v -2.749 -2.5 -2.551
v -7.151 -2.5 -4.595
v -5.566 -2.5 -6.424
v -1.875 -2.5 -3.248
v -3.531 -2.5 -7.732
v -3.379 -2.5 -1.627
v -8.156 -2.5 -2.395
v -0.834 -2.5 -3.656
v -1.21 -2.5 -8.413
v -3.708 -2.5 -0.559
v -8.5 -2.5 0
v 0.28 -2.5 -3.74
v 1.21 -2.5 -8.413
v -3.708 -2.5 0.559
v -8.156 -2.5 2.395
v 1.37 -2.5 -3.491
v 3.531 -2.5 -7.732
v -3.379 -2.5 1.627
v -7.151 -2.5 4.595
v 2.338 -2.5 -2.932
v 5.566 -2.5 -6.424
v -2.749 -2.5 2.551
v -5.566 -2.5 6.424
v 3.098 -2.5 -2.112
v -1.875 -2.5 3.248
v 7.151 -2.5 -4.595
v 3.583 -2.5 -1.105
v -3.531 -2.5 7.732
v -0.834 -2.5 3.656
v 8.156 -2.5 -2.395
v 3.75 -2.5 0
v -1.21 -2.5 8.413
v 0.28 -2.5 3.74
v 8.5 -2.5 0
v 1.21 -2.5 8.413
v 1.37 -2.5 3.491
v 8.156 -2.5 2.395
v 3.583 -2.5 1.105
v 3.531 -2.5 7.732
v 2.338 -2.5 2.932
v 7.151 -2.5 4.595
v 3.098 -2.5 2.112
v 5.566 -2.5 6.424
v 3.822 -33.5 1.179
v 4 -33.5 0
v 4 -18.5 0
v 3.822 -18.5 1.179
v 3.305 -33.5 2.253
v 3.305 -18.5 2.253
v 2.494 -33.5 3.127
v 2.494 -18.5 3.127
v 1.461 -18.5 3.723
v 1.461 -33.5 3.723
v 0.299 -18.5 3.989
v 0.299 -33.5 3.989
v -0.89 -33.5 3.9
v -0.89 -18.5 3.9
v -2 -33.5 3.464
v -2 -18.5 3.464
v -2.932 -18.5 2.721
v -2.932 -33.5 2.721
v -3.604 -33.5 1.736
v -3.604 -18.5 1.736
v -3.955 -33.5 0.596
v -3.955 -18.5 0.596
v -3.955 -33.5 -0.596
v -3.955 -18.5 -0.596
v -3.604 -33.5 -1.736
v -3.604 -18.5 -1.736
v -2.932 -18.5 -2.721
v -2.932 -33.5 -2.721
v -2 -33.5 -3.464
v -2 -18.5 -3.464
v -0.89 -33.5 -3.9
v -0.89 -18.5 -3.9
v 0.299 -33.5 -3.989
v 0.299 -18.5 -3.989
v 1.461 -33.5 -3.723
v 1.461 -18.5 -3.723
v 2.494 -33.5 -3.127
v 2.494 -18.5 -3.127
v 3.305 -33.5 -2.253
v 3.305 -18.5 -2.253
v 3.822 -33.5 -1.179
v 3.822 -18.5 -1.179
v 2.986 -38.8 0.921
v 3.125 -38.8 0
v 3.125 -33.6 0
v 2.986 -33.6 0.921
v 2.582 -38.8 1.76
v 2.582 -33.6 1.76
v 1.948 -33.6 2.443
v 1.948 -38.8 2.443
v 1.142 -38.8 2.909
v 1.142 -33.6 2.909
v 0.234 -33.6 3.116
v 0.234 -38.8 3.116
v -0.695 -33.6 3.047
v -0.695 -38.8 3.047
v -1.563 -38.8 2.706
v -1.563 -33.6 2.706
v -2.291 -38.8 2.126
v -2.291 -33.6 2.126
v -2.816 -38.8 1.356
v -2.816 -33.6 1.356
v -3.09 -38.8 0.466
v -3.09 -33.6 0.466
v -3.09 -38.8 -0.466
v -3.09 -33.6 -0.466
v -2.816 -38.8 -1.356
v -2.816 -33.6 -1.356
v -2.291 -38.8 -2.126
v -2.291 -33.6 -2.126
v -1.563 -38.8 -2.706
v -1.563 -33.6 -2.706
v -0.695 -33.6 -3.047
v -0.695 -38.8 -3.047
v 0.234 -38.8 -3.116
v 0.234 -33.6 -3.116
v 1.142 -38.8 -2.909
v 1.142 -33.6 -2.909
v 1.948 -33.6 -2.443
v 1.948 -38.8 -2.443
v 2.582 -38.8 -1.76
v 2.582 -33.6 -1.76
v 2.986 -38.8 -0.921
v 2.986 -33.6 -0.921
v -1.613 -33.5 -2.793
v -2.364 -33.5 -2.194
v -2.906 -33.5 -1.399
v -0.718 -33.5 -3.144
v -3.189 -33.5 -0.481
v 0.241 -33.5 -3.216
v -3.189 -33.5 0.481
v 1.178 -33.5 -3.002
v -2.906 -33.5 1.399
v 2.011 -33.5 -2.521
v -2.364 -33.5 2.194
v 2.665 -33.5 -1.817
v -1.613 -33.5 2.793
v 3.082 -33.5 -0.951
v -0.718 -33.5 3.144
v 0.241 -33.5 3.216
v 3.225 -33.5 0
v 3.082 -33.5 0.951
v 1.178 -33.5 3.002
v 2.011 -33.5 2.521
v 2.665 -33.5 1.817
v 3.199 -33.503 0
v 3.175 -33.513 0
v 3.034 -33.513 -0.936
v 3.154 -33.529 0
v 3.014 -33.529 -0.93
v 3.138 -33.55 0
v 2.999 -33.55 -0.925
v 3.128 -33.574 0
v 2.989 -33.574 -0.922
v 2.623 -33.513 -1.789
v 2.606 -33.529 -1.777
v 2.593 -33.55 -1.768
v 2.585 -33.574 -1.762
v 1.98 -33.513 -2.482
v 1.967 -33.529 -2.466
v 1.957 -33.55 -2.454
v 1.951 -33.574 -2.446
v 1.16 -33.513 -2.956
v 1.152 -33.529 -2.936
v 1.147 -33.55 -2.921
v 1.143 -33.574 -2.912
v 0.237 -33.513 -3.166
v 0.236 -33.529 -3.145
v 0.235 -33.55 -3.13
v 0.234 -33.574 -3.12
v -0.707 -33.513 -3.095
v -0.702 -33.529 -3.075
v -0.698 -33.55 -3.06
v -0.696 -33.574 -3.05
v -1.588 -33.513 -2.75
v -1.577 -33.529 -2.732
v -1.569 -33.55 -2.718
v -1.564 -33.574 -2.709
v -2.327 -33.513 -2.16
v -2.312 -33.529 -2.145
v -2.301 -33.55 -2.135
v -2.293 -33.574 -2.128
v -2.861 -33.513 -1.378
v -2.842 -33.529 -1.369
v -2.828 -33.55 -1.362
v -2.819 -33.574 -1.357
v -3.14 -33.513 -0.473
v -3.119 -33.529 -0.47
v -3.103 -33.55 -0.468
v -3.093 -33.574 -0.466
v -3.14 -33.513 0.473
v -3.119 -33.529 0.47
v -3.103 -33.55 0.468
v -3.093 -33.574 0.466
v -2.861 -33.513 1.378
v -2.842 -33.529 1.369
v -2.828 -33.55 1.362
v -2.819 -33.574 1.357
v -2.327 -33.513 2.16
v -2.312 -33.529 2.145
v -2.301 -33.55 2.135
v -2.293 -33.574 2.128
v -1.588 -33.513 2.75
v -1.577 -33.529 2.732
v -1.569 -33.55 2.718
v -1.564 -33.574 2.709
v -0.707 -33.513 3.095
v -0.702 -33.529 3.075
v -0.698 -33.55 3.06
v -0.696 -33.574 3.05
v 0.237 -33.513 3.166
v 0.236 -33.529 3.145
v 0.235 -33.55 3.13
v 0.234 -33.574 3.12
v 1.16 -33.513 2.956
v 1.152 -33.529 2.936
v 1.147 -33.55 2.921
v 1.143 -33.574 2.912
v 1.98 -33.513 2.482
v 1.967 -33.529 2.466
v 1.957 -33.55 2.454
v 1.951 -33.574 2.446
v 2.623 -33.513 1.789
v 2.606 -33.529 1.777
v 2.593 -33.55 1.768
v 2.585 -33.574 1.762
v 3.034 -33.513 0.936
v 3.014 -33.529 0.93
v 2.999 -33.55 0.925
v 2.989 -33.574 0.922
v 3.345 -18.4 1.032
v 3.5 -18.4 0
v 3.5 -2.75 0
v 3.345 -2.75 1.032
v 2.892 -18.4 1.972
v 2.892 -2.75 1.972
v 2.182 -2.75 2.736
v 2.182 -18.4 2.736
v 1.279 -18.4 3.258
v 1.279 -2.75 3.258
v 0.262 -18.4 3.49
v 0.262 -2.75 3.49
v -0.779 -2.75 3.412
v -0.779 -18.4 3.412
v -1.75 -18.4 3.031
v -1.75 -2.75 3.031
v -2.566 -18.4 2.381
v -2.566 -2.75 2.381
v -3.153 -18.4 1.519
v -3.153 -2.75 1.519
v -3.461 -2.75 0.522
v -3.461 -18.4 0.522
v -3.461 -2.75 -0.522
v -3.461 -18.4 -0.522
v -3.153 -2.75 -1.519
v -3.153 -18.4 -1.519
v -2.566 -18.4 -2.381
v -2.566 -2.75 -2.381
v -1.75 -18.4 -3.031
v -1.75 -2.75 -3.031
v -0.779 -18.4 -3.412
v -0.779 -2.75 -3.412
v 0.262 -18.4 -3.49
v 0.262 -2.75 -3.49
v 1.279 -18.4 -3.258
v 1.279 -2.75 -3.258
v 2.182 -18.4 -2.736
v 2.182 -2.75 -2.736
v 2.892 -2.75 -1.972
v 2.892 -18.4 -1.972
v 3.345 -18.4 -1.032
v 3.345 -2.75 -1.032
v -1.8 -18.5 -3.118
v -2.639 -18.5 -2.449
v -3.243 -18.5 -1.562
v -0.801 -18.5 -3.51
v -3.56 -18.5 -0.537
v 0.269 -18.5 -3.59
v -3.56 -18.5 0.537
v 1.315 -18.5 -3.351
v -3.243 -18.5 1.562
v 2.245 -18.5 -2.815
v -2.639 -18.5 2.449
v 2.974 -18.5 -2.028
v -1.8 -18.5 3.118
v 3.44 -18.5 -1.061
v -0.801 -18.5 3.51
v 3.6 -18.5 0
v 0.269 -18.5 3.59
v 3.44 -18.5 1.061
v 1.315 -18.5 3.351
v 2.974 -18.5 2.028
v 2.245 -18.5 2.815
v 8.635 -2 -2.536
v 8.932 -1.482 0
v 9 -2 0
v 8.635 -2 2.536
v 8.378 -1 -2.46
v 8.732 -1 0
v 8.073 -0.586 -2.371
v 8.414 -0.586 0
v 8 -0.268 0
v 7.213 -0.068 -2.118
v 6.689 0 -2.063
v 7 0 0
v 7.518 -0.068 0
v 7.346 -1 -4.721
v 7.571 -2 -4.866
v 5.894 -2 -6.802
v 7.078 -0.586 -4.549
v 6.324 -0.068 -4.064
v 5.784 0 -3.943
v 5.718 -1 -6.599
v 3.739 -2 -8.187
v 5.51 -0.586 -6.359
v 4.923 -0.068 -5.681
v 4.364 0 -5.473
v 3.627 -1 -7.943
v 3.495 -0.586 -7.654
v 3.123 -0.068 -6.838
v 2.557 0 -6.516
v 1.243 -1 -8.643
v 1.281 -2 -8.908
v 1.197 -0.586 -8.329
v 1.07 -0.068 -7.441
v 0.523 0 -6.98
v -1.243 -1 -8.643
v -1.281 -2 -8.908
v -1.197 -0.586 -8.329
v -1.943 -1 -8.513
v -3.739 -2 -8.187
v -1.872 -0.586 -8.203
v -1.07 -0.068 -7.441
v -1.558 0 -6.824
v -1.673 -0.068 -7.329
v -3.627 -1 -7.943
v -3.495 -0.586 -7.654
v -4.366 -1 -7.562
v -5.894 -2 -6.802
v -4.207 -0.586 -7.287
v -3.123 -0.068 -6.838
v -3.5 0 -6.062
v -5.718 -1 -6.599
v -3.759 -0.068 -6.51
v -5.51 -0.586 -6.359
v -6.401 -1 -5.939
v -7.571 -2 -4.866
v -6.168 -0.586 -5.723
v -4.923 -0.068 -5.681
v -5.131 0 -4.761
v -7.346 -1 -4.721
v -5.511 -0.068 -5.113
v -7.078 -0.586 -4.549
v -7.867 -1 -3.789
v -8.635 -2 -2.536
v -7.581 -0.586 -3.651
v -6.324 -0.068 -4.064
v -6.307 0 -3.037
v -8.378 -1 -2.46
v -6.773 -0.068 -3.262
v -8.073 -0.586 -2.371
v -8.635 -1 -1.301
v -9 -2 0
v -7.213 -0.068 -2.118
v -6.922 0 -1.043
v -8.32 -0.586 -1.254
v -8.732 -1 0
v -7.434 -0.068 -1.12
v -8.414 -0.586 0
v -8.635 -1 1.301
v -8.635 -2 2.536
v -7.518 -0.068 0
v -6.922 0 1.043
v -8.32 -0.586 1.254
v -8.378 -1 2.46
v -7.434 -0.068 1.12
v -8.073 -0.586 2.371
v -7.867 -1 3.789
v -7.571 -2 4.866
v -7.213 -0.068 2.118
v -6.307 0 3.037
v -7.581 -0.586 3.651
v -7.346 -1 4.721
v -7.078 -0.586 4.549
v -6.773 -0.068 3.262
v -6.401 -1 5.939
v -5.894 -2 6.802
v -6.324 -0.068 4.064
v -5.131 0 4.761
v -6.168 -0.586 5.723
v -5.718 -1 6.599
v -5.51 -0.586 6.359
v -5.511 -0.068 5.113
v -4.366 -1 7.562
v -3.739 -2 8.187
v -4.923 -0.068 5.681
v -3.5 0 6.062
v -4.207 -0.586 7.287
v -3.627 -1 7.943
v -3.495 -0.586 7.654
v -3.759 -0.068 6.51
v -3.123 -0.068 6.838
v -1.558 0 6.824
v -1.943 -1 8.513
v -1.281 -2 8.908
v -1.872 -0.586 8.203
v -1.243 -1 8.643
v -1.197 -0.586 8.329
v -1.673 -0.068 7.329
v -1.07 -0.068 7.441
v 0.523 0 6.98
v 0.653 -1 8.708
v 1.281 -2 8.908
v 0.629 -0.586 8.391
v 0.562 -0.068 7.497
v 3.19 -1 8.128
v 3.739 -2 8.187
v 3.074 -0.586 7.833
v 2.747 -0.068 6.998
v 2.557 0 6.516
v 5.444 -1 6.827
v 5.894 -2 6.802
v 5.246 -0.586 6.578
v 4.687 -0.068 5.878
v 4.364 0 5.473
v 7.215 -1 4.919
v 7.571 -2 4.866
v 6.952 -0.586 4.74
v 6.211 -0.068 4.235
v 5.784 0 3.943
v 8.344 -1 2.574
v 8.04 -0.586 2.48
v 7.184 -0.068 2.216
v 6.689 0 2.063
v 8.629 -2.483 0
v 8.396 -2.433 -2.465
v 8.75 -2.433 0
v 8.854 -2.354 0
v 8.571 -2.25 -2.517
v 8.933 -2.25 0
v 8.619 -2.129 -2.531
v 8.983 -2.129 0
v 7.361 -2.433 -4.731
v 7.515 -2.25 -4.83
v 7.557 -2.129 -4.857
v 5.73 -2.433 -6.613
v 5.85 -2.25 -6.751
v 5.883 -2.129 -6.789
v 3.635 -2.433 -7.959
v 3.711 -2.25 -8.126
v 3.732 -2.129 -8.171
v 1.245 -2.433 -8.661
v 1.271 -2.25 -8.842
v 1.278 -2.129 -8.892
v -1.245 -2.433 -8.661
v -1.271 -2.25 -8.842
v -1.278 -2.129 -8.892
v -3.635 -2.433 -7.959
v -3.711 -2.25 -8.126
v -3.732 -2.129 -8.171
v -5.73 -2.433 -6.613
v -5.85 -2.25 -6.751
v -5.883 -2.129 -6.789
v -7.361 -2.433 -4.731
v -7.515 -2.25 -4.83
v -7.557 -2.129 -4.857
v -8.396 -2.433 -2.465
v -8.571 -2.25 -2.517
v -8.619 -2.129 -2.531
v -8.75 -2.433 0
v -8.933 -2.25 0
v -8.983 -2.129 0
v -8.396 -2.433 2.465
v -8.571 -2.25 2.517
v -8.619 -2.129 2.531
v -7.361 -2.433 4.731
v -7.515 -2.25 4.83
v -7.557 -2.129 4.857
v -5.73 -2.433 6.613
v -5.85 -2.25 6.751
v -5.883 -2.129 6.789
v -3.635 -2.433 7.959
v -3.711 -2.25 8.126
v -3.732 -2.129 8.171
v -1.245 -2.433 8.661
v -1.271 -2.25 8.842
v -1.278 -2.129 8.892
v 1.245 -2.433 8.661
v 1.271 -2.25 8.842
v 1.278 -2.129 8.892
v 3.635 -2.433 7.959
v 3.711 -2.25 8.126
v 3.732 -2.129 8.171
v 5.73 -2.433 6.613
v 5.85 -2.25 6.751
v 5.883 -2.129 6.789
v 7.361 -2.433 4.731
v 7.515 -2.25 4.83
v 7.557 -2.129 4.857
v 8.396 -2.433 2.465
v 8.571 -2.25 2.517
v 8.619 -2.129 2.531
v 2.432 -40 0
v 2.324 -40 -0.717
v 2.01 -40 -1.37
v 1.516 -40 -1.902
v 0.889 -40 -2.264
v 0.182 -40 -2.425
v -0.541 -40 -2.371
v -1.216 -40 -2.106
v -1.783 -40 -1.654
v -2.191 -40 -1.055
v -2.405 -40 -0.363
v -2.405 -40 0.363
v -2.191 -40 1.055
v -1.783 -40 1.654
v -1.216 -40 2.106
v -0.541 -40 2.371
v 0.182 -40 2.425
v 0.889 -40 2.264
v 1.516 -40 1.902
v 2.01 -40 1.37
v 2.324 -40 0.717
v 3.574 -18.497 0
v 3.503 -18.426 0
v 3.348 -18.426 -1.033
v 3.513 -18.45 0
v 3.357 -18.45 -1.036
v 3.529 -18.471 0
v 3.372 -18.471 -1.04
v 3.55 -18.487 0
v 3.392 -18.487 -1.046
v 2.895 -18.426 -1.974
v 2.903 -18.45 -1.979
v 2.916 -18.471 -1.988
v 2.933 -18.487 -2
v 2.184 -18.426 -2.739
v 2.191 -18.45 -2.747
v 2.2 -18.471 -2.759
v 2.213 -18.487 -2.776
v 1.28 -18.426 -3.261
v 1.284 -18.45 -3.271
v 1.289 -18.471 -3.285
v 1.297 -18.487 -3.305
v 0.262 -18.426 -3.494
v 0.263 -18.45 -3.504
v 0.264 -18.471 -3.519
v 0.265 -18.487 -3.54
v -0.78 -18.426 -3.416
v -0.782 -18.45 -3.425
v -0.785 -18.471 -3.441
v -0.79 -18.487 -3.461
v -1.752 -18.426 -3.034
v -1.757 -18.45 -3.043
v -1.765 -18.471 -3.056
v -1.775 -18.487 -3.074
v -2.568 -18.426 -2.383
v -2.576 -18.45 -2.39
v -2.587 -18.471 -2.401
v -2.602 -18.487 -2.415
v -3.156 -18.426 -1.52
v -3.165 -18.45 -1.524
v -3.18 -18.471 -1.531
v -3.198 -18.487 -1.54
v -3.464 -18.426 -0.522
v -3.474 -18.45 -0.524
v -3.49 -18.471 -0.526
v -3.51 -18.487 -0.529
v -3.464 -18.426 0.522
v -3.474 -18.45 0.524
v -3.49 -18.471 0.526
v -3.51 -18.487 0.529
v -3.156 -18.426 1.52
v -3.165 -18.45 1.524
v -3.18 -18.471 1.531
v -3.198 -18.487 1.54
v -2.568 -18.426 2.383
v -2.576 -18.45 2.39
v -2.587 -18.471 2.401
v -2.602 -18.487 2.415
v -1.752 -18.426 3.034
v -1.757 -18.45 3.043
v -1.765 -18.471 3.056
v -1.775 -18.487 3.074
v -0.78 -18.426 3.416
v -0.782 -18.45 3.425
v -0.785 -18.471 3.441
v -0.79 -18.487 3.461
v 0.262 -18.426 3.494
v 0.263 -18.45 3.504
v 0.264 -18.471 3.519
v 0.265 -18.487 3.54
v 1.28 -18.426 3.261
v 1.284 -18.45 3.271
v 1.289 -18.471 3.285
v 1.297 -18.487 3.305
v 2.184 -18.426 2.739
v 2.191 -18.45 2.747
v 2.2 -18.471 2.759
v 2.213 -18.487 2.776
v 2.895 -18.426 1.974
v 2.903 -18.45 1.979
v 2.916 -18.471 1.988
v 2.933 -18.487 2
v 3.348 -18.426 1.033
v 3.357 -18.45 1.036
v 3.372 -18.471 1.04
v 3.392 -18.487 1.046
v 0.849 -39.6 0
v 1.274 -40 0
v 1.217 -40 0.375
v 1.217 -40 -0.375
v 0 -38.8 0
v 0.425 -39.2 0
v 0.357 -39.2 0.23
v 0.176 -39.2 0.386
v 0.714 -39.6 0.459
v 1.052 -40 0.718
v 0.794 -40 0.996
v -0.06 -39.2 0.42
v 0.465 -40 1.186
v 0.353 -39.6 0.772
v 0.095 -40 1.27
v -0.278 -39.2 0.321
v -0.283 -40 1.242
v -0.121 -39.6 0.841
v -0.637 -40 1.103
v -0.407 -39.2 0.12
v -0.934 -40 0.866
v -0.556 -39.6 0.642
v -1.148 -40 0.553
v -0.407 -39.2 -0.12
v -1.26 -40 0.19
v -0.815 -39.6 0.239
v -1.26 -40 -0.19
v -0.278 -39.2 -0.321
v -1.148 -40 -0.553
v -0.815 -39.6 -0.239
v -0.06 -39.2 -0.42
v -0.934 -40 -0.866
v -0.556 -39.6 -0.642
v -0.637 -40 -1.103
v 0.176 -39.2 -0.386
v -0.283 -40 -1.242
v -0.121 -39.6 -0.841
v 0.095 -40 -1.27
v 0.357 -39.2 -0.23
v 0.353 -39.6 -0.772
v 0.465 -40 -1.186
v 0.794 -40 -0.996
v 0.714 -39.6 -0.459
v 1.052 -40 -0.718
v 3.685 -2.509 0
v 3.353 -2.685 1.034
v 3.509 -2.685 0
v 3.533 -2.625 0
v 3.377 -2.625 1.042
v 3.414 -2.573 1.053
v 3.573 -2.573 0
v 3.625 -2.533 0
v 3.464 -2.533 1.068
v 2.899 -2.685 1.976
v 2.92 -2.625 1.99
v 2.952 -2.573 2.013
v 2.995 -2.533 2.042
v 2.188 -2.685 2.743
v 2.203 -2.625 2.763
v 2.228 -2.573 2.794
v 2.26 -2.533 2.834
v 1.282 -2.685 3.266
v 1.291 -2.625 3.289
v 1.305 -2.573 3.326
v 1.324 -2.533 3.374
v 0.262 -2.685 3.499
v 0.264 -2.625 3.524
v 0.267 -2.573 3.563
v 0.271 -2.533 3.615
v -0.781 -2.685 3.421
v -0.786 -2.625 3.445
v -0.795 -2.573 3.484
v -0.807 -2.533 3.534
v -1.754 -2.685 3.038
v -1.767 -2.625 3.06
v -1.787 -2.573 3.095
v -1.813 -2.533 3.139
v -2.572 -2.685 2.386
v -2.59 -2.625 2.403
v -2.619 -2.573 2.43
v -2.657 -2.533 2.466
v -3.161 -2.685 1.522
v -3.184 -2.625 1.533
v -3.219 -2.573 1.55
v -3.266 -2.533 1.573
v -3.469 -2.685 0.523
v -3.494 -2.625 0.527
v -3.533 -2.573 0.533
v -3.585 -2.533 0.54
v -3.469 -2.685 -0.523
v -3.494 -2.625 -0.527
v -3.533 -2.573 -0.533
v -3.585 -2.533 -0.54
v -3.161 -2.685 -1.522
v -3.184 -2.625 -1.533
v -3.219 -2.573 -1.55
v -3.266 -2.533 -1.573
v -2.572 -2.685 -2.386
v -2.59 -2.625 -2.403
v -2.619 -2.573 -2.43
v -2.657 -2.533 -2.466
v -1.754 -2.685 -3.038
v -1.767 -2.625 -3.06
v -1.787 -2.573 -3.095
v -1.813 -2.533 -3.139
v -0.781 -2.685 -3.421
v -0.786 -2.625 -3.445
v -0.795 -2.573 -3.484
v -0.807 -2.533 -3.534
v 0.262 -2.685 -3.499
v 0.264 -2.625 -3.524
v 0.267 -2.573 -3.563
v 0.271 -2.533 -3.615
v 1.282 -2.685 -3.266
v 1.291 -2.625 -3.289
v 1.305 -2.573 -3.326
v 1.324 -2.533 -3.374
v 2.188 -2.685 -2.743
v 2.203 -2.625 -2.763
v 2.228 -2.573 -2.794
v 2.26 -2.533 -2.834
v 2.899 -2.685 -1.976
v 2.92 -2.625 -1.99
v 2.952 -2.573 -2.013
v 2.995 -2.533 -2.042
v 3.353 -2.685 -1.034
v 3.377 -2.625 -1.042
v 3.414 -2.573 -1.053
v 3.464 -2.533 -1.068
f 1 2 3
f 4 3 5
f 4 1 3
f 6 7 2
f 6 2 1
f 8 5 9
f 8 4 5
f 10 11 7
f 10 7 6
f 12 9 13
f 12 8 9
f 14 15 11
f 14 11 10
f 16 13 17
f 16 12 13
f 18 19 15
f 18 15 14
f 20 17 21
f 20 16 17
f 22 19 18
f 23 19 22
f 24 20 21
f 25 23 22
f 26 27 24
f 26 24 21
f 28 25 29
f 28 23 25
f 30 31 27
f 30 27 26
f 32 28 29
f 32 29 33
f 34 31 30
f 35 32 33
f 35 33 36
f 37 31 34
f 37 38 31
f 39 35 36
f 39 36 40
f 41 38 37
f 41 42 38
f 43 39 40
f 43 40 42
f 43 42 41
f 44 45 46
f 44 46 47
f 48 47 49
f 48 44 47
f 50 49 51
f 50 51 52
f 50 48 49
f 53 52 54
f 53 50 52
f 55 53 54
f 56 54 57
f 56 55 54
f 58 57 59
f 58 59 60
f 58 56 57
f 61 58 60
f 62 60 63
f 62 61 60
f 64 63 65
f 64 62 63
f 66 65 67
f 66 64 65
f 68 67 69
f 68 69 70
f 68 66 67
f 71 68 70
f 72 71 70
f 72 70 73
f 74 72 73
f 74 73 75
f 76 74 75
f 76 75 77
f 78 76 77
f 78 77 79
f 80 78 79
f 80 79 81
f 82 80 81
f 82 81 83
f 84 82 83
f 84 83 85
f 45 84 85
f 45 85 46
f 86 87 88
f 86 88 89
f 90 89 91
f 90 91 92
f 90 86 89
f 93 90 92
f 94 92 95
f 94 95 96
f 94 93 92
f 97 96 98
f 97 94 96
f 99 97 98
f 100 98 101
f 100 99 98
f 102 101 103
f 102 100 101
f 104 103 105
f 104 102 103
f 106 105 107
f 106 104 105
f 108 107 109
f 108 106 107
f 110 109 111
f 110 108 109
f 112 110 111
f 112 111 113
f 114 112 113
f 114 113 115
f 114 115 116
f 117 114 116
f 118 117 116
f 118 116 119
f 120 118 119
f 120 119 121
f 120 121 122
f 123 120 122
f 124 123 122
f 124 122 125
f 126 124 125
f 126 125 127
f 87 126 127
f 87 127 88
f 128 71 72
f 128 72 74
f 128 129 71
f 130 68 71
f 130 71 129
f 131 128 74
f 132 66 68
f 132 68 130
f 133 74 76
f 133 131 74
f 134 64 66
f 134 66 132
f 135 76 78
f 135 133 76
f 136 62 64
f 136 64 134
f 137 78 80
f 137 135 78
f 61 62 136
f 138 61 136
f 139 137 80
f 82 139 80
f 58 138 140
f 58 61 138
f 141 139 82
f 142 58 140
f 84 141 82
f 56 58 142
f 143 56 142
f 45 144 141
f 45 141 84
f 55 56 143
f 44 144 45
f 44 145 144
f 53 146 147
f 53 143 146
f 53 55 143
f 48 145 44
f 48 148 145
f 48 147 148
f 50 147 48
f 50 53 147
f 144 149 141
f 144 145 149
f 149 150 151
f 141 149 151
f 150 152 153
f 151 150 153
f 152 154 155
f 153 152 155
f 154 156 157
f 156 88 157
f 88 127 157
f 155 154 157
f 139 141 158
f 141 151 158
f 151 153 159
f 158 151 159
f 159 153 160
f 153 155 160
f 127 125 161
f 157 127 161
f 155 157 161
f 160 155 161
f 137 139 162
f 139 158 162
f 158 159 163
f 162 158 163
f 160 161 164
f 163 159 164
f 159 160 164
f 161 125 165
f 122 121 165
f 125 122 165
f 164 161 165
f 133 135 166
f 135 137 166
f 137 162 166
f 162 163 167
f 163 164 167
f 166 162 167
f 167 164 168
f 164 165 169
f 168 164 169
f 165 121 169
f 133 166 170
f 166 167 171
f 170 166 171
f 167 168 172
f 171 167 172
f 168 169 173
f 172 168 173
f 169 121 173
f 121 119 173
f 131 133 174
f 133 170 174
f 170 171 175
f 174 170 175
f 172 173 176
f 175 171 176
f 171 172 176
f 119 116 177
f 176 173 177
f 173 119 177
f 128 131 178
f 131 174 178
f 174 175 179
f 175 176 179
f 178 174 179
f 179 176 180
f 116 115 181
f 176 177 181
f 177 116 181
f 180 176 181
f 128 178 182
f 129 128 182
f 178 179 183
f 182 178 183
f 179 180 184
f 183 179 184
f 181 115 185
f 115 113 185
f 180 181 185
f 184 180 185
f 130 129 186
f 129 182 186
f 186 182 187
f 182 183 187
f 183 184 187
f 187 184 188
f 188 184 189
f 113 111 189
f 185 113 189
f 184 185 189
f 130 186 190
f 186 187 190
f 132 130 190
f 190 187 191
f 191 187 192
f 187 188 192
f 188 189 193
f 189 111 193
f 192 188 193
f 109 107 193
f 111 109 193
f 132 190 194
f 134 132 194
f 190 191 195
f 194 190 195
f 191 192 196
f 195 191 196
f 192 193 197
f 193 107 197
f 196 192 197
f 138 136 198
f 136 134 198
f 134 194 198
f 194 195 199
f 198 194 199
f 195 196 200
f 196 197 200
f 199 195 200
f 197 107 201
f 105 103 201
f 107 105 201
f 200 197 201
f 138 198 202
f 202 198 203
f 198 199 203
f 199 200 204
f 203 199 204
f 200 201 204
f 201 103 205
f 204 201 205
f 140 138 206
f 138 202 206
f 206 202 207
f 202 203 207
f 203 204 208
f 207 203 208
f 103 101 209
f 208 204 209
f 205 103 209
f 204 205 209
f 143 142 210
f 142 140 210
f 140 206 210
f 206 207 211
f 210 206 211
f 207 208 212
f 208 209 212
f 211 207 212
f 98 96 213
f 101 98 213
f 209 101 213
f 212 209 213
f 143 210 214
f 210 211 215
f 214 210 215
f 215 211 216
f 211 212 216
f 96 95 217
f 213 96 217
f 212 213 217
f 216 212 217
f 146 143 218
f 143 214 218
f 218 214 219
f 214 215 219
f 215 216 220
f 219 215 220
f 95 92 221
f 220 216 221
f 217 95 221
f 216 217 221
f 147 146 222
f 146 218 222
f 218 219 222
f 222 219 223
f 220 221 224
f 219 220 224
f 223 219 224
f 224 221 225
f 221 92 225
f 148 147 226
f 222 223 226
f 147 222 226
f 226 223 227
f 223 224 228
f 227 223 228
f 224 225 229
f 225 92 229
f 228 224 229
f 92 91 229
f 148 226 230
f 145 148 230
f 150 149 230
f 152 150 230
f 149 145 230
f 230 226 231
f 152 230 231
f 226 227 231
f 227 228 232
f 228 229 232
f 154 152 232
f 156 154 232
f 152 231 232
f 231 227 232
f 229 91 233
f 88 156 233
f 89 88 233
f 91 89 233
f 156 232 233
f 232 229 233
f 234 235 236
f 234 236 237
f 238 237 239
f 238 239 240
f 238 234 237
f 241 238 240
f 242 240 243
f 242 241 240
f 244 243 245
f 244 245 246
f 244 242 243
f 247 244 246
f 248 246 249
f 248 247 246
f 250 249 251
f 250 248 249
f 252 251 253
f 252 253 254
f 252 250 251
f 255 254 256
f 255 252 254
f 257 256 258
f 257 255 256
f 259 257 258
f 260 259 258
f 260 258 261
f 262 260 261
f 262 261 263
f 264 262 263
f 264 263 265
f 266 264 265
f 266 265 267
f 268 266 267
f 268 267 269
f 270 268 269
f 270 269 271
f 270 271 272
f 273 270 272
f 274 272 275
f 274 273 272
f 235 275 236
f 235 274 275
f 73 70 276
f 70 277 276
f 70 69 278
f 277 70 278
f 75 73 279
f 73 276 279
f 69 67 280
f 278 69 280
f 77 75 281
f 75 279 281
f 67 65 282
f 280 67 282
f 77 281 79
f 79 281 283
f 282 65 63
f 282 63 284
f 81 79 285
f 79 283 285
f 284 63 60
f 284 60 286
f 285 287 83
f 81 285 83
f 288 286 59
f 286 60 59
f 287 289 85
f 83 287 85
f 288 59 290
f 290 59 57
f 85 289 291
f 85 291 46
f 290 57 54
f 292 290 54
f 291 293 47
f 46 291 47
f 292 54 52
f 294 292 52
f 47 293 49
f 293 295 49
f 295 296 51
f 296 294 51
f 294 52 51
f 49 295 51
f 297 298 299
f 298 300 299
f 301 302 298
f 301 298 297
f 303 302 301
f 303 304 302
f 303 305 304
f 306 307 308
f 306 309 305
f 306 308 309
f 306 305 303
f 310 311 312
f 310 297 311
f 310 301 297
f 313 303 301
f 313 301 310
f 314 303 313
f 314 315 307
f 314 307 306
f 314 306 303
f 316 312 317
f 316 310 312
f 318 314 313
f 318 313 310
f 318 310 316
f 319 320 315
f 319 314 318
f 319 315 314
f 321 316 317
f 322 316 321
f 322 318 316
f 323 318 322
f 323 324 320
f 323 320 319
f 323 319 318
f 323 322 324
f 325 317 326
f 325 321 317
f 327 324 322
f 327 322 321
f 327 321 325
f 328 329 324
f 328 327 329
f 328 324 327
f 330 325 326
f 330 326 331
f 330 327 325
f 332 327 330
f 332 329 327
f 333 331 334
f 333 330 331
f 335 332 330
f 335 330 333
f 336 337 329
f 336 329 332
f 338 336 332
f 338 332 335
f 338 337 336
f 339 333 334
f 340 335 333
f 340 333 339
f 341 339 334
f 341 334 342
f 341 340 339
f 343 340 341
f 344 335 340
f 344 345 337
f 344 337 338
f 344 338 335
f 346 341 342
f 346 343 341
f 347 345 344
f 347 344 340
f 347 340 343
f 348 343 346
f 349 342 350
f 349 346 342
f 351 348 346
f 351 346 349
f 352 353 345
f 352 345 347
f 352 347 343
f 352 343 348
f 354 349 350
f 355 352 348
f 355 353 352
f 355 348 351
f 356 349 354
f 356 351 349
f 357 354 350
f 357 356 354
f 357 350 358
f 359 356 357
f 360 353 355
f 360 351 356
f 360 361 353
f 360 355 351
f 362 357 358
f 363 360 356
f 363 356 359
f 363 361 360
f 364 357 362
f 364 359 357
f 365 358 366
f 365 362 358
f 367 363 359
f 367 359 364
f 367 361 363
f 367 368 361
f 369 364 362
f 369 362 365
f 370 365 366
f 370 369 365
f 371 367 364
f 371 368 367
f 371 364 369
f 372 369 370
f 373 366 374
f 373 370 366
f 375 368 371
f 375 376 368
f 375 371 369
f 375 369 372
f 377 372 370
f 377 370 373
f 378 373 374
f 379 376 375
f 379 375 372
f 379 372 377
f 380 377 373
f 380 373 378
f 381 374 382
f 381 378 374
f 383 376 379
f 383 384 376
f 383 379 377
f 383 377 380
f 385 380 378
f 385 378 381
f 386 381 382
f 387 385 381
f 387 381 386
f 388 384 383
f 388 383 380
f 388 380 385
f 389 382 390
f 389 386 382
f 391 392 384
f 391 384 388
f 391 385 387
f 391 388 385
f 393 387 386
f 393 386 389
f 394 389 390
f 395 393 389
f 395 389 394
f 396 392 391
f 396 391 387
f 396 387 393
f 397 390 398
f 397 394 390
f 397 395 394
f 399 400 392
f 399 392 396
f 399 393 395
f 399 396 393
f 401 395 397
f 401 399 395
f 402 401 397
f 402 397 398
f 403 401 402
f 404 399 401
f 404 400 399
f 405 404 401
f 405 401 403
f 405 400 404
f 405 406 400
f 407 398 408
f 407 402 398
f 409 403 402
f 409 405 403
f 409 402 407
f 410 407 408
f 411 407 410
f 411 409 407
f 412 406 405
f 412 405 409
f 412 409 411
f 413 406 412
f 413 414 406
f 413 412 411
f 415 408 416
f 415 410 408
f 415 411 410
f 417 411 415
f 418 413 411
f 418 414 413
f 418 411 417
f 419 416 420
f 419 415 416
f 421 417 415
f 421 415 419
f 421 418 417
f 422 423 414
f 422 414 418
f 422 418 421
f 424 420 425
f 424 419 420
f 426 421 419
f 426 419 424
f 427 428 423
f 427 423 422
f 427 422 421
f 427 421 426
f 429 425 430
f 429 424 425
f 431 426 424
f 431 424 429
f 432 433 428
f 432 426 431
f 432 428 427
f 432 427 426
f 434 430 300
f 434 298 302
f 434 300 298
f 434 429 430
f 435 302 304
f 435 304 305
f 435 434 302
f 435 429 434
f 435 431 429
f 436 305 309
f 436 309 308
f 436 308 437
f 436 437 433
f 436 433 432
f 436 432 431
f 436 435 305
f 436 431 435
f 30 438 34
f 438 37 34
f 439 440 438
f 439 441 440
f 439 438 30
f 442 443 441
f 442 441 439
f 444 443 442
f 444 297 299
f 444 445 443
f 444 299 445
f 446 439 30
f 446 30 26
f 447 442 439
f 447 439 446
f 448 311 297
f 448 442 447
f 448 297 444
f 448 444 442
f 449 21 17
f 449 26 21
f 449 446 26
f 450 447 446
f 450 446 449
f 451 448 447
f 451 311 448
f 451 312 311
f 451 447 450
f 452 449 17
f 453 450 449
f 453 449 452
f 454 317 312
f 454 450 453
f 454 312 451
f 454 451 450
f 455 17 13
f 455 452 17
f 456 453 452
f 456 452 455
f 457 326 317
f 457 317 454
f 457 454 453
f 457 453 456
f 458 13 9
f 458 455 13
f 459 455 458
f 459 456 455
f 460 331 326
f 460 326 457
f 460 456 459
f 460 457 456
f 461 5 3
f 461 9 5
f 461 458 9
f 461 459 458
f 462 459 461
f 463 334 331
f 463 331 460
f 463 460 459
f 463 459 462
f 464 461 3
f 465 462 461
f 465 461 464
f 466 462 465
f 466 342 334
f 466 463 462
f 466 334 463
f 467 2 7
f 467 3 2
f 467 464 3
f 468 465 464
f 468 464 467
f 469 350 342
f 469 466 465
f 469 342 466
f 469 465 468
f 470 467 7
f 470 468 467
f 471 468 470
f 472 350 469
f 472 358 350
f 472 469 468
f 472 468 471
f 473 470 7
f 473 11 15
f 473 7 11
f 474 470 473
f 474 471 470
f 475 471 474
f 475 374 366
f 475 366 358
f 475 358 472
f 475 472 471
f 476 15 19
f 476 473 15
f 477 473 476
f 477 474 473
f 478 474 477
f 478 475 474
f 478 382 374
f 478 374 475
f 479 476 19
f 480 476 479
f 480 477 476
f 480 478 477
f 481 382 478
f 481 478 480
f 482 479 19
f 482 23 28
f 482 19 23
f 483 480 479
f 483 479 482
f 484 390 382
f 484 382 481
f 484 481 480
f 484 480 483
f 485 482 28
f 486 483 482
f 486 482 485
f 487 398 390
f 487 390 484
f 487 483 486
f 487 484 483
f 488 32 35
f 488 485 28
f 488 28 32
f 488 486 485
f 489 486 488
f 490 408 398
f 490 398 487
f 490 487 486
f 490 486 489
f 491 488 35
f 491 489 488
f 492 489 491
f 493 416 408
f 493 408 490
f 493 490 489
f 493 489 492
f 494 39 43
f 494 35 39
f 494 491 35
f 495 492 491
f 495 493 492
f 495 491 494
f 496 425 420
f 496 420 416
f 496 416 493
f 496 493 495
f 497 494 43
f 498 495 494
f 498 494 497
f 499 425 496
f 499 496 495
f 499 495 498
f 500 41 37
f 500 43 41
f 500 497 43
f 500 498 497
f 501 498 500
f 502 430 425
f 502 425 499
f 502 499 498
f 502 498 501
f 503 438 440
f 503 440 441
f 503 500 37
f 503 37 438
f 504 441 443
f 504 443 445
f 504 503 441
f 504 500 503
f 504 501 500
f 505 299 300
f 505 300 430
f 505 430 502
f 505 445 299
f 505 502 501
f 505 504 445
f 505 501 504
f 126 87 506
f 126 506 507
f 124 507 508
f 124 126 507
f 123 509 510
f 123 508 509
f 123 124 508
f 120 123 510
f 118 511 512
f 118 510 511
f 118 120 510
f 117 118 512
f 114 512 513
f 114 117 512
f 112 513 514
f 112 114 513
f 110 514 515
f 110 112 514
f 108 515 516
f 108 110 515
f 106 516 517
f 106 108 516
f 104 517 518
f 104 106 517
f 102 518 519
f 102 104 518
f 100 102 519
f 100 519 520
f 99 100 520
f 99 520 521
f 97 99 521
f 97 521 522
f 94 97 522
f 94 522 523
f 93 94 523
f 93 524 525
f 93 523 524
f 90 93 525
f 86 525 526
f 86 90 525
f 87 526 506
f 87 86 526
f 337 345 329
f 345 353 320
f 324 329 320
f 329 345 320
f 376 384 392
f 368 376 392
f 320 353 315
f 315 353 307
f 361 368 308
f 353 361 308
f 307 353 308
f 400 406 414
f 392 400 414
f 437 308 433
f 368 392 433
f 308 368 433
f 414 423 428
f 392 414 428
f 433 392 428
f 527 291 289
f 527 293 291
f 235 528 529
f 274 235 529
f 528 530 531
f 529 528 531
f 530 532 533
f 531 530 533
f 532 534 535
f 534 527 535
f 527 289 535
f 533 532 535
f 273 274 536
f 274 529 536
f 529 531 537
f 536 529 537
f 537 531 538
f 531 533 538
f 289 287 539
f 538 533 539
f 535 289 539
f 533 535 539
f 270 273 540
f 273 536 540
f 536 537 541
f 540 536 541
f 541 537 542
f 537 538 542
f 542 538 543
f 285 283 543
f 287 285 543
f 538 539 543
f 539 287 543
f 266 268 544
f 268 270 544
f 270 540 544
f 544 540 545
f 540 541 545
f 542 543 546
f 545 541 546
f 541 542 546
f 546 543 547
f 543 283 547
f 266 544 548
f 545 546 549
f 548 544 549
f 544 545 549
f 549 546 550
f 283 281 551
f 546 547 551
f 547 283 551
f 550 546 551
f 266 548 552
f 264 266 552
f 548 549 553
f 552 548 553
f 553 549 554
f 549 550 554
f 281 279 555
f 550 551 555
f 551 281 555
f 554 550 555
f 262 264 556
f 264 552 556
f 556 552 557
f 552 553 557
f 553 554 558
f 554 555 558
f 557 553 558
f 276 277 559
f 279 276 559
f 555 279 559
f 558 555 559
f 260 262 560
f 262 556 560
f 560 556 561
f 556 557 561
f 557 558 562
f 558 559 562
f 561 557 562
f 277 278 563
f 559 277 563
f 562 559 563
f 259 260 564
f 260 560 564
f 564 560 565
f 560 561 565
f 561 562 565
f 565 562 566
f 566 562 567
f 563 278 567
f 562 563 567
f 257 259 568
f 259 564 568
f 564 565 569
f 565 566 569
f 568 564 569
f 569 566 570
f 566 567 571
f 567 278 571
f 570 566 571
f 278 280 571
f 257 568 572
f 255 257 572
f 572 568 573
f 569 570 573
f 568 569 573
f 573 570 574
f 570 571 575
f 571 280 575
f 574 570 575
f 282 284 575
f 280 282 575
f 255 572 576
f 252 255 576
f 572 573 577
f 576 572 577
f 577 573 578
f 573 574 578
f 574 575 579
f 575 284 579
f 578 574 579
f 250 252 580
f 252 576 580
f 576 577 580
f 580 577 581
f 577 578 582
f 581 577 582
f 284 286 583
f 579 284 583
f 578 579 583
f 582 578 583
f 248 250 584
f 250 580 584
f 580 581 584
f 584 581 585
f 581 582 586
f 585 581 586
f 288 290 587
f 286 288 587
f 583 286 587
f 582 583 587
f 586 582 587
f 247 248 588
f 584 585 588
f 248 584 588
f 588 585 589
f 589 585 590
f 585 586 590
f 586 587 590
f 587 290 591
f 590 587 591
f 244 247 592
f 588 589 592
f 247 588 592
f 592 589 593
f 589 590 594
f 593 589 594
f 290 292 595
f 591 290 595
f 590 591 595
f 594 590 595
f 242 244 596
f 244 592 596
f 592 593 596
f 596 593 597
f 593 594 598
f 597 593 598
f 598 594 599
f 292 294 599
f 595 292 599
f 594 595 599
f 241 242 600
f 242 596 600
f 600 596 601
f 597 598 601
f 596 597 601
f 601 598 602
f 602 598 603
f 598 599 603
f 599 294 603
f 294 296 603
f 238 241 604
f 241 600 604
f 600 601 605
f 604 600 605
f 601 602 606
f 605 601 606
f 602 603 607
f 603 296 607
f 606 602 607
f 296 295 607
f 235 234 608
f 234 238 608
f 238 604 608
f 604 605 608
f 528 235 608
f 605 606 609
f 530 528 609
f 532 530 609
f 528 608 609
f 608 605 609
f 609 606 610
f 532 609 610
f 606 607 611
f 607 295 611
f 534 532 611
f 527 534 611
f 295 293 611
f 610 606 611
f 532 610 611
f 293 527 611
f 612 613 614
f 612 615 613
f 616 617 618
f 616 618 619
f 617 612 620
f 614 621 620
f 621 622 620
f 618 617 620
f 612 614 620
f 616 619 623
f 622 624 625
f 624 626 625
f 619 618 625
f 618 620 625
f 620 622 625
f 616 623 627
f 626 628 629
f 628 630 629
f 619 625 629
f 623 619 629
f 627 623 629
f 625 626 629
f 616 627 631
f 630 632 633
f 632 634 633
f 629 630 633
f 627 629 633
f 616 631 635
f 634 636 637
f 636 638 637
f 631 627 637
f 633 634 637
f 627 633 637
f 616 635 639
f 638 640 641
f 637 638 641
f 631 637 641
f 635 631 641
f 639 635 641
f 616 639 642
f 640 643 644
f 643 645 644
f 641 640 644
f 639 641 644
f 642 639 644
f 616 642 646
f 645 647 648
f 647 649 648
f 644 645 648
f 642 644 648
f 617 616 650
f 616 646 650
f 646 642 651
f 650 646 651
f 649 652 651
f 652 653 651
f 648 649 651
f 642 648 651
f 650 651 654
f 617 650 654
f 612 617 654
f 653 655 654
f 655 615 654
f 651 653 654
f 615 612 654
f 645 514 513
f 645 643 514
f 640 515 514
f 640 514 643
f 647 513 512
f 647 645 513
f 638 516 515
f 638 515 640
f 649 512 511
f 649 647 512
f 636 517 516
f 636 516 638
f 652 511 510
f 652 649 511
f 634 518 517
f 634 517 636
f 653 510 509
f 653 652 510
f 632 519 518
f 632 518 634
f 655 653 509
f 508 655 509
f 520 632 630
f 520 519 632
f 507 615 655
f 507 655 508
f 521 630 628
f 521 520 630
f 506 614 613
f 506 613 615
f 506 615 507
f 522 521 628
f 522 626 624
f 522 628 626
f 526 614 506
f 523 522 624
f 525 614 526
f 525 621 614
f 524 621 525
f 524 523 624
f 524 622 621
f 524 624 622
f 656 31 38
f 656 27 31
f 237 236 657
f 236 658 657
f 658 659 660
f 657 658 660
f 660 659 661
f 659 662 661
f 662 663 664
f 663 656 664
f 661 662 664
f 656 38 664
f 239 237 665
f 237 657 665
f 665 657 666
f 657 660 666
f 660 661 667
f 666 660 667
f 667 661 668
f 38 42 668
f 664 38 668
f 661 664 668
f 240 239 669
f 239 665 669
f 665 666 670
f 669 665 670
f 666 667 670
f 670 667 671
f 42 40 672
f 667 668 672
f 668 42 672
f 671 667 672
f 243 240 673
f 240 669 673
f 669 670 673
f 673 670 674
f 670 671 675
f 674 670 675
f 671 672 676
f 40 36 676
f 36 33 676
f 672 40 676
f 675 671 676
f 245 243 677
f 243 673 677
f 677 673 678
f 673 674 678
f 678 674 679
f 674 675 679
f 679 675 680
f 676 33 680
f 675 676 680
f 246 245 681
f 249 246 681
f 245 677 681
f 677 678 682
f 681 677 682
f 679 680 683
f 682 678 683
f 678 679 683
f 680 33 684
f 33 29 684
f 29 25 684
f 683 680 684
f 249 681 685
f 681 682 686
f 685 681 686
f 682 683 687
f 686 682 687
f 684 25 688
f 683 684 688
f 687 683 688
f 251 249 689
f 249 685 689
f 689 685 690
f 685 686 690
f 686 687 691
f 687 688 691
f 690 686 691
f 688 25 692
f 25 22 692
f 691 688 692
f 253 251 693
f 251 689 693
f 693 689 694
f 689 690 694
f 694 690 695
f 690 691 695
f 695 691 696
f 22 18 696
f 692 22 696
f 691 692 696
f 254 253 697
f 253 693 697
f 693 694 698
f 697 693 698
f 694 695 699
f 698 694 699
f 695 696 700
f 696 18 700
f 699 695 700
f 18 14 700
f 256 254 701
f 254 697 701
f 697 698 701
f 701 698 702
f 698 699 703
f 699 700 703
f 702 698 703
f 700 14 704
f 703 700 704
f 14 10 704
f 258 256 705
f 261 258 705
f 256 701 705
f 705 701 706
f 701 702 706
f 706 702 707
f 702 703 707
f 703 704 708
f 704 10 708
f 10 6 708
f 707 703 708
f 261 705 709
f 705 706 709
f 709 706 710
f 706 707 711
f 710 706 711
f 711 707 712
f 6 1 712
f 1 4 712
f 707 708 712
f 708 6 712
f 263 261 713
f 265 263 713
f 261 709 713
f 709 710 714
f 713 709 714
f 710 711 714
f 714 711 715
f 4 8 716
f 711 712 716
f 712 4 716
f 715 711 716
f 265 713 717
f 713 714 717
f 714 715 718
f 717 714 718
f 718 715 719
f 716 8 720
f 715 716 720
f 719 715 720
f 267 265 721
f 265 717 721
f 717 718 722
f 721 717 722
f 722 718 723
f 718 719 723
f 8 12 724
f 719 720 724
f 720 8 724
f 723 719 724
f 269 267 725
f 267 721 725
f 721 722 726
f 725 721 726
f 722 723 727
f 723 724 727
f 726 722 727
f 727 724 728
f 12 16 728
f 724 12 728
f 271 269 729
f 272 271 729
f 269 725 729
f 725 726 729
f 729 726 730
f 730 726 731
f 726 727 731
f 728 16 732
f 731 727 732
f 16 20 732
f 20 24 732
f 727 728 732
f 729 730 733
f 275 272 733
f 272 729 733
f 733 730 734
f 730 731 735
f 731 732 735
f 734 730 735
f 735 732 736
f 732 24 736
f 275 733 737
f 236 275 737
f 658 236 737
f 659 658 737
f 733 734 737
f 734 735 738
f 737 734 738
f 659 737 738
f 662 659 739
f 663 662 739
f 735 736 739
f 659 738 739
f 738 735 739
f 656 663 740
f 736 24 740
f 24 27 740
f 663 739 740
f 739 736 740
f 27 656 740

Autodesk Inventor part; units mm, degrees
ref_plane "YZ Plane" through (0, 0, 0) normal (1, 0, 0) x (0, 1, 0)
ref_plane "XZ Plane" through (0, 0, 0) normal (0, 1, 0) x (-1, 0, 0)
ref_plane "XY Plane" through (0, 0, 0) normal (0, 0, 1) x (1, 0, 0)
sketch "Sketch1" plane through (0, 0, 0) normal (0, 0, 1) x (1, 0, 0)
  line L0 (0, 0) -> (0, -38.8)
  line L1 (0, 0) -> (7, 0)
  line L2 (9, -2) -> (9, -2)
  line L3 (8.5, -2.5) -> (3.5, -2.5)
  line L4 (3.5, -2.5) -> (3.5, -18.5)
  line L5 (3.5, -18.5) -> (4, -18.5)
  line L6 (4, -18.5) -> (4, -33.5)
  line L7 (4, -33.5) -> (3.125, -33.5)
  line L8 (3.125, -33.5) -> (3.125, -38.8)
  line L9 (3.125, -38.8) -> (2.4322, -40)
  line L10 (2.4322, -40) -> (1.2738, -40)
  arc A0 (8.5, -2.5) -> (9, -2) centre (8.5, -2) ccw
  arc A1 (9, -2) -> (7, 0) centre (7, -2) ccw
  line L11 (0, -38.8) -> (1.2738, -40)
  dimension "d1" = 2.5
  dimension "d2" = 16
  dimension "d3" = 15
  dimension "d4" = 1.2
  dimension "d5" = 60
  dimension "d6" = 3.125
  dimension "d7" = 3.5
  dimension "d8" = 4
  dimension "d9" = 9
  dimension "d10" = 0.5
  dimension "d11" = 2
  dimension "d12" = 1.75
  dimension "d15" = 40
revolve "Revolution1" add sketch "Sketch1" angle 360 about axis through (0, 0, 0) along (0, -1, 0)
fillet "Fillet1" radius 0.1 2 edges at (-3.125, -33.5, 0) (-3.5, -18.5, 0)
fillet "Fillet2" radius 0.25 1 edges at (-3.5, -2.5, 0)
properties part number "100-02" material "Stainless Steel"
